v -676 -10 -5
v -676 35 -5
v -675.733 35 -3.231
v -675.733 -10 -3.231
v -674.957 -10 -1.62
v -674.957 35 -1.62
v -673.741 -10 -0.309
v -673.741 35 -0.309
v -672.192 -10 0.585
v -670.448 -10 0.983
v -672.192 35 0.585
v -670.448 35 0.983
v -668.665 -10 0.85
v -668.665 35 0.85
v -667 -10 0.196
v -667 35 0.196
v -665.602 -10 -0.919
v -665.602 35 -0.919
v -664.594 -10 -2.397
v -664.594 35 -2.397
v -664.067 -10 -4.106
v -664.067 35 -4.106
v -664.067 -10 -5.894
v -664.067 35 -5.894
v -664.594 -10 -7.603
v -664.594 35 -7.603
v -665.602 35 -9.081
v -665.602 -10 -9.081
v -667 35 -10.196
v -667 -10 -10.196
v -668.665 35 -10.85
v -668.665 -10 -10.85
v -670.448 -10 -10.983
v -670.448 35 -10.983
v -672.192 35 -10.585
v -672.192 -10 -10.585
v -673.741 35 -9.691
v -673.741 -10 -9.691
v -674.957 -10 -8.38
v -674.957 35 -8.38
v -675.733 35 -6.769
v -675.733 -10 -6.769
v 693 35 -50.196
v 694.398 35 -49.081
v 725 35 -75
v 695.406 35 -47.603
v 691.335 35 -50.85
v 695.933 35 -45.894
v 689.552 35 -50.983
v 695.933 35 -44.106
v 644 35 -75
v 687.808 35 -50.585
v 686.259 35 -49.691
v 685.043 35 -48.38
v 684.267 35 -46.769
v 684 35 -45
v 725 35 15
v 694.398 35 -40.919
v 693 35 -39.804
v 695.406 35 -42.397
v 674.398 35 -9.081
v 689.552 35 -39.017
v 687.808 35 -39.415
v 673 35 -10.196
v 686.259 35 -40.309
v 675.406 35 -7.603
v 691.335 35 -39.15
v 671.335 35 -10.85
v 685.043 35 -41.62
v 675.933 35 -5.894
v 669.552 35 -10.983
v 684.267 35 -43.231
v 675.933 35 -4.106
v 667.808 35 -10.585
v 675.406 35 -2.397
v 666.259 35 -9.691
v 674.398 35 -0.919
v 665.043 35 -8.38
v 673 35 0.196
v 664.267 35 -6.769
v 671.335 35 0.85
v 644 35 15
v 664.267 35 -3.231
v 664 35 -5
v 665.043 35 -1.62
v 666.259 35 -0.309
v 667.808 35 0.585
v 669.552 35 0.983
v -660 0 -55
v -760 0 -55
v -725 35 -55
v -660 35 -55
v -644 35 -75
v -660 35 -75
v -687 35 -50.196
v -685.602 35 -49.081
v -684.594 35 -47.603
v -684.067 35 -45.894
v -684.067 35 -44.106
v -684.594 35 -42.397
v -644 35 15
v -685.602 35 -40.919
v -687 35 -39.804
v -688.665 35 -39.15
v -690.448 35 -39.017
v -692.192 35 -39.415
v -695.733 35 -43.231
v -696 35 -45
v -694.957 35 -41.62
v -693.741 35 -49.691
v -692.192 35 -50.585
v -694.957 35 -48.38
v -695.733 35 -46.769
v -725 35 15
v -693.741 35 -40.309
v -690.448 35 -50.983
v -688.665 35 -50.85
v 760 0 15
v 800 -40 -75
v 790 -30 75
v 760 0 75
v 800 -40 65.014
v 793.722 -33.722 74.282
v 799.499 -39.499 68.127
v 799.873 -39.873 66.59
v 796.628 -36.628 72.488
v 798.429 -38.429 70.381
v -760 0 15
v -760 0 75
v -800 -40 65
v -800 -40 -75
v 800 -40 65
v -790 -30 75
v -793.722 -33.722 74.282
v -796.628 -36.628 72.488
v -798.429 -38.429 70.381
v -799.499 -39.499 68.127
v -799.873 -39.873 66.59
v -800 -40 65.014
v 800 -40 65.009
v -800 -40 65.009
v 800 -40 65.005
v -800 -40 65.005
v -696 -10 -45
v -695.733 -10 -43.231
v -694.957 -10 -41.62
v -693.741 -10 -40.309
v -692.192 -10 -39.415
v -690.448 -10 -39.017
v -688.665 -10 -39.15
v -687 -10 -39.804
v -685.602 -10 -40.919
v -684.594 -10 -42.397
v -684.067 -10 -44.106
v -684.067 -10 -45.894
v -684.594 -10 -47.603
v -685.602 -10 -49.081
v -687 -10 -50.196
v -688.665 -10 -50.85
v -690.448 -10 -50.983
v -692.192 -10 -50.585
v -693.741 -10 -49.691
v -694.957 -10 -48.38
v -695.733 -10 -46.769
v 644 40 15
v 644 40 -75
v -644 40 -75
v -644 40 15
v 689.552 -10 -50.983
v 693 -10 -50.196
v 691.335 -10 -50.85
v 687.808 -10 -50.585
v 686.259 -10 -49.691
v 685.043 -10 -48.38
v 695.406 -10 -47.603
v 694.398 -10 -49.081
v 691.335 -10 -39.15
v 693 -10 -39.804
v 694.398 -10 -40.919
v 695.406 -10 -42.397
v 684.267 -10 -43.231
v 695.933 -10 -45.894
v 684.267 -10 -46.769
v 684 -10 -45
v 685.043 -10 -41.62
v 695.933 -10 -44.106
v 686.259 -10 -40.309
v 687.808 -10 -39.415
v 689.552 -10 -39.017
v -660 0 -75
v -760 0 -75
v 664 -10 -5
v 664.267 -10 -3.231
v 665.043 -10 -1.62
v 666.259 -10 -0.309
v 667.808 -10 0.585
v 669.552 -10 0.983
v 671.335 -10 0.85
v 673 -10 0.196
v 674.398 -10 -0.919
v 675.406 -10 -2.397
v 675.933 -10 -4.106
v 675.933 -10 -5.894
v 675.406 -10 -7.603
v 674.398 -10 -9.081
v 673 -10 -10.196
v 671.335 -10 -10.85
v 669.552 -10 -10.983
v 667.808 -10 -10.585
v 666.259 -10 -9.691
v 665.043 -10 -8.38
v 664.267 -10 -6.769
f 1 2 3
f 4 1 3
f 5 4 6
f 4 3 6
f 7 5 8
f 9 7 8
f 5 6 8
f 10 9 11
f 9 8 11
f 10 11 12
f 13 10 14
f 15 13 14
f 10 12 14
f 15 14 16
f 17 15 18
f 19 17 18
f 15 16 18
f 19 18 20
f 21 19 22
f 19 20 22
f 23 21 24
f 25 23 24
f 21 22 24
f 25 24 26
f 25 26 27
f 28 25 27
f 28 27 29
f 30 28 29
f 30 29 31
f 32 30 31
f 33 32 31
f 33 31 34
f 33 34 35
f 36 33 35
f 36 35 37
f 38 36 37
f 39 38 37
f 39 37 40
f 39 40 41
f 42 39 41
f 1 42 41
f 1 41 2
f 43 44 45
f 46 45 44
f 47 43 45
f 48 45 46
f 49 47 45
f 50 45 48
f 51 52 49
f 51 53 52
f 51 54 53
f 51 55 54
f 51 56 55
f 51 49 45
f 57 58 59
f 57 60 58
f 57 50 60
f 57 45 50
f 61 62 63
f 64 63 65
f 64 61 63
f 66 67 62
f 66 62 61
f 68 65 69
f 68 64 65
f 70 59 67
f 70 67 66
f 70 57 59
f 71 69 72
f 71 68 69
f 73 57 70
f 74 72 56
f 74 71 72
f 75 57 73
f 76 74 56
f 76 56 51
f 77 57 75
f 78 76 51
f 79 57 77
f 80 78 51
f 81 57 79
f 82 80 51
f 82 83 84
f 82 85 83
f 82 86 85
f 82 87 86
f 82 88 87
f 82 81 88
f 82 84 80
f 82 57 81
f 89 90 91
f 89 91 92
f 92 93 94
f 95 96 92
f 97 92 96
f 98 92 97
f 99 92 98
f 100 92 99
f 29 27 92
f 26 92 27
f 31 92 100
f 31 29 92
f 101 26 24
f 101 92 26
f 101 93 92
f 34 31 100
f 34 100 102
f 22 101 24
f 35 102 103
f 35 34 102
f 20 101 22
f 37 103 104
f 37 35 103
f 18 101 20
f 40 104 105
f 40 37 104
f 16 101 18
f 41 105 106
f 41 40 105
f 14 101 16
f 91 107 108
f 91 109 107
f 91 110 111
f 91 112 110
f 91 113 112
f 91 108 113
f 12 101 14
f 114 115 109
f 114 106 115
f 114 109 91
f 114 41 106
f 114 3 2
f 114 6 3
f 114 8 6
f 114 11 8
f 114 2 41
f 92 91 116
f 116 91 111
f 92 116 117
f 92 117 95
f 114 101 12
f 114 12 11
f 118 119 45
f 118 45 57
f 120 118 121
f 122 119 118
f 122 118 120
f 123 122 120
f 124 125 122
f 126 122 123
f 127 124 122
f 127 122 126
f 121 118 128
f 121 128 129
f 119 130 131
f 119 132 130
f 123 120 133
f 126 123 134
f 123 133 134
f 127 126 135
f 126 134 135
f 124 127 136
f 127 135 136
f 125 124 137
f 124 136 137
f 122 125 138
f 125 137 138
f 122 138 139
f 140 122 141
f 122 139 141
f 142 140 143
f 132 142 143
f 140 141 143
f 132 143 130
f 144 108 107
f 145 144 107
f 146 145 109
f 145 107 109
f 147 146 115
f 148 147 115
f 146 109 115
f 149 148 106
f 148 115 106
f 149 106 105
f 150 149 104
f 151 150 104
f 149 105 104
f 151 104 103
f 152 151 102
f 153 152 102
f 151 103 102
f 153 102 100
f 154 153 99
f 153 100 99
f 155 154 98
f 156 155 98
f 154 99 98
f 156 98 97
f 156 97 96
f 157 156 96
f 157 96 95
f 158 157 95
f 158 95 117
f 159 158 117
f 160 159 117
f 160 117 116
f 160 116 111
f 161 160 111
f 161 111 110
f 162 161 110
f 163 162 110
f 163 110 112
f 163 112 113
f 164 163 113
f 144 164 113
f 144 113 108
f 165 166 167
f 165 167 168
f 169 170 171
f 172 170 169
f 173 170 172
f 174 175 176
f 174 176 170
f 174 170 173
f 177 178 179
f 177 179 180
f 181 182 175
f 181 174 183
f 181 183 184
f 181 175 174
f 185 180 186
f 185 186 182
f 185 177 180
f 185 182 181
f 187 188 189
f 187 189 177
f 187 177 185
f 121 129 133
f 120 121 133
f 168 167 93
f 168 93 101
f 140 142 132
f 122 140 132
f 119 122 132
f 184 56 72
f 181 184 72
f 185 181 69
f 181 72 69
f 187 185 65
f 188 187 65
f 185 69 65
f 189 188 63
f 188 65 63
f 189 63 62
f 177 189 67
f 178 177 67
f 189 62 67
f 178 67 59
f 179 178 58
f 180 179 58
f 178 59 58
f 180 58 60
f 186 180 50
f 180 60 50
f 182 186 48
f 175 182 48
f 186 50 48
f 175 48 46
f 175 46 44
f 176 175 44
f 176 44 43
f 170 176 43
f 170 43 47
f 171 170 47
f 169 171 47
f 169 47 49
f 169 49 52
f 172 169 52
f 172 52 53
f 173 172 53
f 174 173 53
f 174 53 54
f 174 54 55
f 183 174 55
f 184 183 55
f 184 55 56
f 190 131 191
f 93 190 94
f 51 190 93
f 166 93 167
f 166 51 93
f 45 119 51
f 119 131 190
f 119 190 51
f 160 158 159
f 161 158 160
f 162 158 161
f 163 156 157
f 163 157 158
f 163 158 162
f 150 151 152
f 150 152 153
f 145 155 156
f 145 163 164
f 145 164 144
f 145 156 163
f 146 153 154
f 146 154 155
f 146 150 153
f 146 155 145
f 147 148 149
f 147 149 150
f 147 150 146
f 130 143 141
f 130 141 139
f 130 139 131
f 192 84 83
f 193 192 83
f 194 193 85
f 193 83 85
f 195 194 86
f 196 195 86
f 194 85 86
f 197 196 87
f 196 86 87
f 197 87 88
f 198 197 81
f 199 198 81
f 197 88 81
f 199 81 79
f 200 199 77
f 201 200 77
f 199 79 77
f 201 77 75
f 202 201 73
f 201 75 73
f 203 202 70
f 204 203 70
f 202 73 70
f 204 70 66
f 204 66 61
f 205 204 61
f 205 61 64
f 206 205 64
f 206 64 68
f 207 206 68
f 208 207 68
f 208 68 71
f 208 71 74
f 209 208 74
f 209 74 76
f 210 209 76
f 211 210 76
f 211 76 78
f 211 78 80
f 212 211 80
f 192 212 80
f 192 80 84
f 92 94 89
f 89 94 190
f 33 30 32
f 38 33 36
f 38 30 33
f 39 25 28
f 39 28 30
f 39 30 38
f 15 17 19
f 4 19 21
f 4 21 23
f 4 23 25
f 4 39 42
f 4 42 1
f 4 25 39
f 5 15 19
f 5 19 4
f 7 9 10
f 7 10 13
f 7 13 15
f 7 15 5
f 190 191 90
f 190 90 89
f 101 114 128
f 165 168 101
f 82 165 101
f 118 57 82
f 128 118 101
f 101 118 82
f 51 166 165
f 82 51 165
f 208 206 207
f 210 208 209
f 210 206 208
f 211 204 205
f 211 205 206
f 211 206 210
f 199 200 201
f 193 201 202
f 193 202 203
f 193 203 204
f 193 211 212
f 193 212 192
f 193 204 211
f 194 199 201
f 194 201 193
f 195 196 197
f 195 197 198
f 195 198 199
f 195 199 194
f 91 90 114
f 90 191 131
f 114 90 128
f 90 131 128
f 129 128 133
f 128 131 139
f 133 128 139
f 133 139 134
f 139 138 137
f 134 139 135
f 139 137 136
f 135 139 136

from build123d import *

# Parameters (mm, degrees)
F3_DEPTH  = 800
F4_SIZE   = 79.99999
F5_R      = 6
F6_DEPTH  = 50
F7_W      = 116
F7_H      = 90
F8_DEPTH  = 5
F9_R      = 10
F10_W     = 100
F10_H     = 100
F11_DEPTH = 20


# Not quite as in the source:
# - a fillet or chamfer is up to 0.001 mm smaller than in the source, because OpenCascade refuses the exact size


with BuildPart() as f3:
    # F2 (on Right) → F3 (new body, symmetric)
    with BuildSketch(Plane.YZ):
        Polygon((-40, 75), (-40, -75), (40, -75), (40, 15), (0, 15), (0, 75), align=None)
    extrude(amount=F3_DEPTH, both=True)

    # F4 (size 80 in the source; OpenCascade refuses exactly that, so slightly less here)
    f4_edges = [f3.edges().sort_by_distance(p)[0] for p in [
        (800, 40, -30),
        (-800, 40, -30),
    ]]
    chamfer(f4_edges, length=F4_SIZE)

    # F5 (on face) → F6 (cut)
    with BuildSketch(Plane(origin=(0, 40, 0), x_dir=(-1, 0, 0), z_dir=(0, 1, 0))):
        with Locations((-690, -45)):
            Circle(F5_R)
        with Locations((-670, -5)):
            Circle(F5_R)
        with Locations((670, -5)):
            Circle(F5_R)
        with Locations((690, -45)):
            Circle(F5_R)
    extrude(amount=-F6_DEPTH, mode=Mode.SUBTRACT)

    # F7 (on face) → F8 (cut)
    with BuildSketch(Plane(origin=(0, 40, 0), x_dir=(-1, 0, 0), z_dir=(0, 1, 0))):
        with Locations((-702, -30)):
            Rectangle(F7_W, F7_H)
        with Locations((702, -30)):
            Rectangle(F7_W, F7_H)
    extrude(amount=-F8_DEPTH, mode=Mode.SUBTRACT)

    # F9
    f9_edges = [f3.edges().sort_by_distance(p)[0] for p in [
        (0, -40, 75),
    ]]
    fillet(f9_edges, radius=F9_R)

    # F10 (on face) → F11 (cut)
    with BuildSketch(Plane(origin=(0, 0, -75), x_dir=(1, 0, 0), z_dir=(0, 0, -1))):
        with Locations((-710, -50)):
            Rectangle(F10_W, F10_H)
    extrude(amount=-F11_DEPTH, mode=Mode.SUBTRACT)


solid = f3.part
